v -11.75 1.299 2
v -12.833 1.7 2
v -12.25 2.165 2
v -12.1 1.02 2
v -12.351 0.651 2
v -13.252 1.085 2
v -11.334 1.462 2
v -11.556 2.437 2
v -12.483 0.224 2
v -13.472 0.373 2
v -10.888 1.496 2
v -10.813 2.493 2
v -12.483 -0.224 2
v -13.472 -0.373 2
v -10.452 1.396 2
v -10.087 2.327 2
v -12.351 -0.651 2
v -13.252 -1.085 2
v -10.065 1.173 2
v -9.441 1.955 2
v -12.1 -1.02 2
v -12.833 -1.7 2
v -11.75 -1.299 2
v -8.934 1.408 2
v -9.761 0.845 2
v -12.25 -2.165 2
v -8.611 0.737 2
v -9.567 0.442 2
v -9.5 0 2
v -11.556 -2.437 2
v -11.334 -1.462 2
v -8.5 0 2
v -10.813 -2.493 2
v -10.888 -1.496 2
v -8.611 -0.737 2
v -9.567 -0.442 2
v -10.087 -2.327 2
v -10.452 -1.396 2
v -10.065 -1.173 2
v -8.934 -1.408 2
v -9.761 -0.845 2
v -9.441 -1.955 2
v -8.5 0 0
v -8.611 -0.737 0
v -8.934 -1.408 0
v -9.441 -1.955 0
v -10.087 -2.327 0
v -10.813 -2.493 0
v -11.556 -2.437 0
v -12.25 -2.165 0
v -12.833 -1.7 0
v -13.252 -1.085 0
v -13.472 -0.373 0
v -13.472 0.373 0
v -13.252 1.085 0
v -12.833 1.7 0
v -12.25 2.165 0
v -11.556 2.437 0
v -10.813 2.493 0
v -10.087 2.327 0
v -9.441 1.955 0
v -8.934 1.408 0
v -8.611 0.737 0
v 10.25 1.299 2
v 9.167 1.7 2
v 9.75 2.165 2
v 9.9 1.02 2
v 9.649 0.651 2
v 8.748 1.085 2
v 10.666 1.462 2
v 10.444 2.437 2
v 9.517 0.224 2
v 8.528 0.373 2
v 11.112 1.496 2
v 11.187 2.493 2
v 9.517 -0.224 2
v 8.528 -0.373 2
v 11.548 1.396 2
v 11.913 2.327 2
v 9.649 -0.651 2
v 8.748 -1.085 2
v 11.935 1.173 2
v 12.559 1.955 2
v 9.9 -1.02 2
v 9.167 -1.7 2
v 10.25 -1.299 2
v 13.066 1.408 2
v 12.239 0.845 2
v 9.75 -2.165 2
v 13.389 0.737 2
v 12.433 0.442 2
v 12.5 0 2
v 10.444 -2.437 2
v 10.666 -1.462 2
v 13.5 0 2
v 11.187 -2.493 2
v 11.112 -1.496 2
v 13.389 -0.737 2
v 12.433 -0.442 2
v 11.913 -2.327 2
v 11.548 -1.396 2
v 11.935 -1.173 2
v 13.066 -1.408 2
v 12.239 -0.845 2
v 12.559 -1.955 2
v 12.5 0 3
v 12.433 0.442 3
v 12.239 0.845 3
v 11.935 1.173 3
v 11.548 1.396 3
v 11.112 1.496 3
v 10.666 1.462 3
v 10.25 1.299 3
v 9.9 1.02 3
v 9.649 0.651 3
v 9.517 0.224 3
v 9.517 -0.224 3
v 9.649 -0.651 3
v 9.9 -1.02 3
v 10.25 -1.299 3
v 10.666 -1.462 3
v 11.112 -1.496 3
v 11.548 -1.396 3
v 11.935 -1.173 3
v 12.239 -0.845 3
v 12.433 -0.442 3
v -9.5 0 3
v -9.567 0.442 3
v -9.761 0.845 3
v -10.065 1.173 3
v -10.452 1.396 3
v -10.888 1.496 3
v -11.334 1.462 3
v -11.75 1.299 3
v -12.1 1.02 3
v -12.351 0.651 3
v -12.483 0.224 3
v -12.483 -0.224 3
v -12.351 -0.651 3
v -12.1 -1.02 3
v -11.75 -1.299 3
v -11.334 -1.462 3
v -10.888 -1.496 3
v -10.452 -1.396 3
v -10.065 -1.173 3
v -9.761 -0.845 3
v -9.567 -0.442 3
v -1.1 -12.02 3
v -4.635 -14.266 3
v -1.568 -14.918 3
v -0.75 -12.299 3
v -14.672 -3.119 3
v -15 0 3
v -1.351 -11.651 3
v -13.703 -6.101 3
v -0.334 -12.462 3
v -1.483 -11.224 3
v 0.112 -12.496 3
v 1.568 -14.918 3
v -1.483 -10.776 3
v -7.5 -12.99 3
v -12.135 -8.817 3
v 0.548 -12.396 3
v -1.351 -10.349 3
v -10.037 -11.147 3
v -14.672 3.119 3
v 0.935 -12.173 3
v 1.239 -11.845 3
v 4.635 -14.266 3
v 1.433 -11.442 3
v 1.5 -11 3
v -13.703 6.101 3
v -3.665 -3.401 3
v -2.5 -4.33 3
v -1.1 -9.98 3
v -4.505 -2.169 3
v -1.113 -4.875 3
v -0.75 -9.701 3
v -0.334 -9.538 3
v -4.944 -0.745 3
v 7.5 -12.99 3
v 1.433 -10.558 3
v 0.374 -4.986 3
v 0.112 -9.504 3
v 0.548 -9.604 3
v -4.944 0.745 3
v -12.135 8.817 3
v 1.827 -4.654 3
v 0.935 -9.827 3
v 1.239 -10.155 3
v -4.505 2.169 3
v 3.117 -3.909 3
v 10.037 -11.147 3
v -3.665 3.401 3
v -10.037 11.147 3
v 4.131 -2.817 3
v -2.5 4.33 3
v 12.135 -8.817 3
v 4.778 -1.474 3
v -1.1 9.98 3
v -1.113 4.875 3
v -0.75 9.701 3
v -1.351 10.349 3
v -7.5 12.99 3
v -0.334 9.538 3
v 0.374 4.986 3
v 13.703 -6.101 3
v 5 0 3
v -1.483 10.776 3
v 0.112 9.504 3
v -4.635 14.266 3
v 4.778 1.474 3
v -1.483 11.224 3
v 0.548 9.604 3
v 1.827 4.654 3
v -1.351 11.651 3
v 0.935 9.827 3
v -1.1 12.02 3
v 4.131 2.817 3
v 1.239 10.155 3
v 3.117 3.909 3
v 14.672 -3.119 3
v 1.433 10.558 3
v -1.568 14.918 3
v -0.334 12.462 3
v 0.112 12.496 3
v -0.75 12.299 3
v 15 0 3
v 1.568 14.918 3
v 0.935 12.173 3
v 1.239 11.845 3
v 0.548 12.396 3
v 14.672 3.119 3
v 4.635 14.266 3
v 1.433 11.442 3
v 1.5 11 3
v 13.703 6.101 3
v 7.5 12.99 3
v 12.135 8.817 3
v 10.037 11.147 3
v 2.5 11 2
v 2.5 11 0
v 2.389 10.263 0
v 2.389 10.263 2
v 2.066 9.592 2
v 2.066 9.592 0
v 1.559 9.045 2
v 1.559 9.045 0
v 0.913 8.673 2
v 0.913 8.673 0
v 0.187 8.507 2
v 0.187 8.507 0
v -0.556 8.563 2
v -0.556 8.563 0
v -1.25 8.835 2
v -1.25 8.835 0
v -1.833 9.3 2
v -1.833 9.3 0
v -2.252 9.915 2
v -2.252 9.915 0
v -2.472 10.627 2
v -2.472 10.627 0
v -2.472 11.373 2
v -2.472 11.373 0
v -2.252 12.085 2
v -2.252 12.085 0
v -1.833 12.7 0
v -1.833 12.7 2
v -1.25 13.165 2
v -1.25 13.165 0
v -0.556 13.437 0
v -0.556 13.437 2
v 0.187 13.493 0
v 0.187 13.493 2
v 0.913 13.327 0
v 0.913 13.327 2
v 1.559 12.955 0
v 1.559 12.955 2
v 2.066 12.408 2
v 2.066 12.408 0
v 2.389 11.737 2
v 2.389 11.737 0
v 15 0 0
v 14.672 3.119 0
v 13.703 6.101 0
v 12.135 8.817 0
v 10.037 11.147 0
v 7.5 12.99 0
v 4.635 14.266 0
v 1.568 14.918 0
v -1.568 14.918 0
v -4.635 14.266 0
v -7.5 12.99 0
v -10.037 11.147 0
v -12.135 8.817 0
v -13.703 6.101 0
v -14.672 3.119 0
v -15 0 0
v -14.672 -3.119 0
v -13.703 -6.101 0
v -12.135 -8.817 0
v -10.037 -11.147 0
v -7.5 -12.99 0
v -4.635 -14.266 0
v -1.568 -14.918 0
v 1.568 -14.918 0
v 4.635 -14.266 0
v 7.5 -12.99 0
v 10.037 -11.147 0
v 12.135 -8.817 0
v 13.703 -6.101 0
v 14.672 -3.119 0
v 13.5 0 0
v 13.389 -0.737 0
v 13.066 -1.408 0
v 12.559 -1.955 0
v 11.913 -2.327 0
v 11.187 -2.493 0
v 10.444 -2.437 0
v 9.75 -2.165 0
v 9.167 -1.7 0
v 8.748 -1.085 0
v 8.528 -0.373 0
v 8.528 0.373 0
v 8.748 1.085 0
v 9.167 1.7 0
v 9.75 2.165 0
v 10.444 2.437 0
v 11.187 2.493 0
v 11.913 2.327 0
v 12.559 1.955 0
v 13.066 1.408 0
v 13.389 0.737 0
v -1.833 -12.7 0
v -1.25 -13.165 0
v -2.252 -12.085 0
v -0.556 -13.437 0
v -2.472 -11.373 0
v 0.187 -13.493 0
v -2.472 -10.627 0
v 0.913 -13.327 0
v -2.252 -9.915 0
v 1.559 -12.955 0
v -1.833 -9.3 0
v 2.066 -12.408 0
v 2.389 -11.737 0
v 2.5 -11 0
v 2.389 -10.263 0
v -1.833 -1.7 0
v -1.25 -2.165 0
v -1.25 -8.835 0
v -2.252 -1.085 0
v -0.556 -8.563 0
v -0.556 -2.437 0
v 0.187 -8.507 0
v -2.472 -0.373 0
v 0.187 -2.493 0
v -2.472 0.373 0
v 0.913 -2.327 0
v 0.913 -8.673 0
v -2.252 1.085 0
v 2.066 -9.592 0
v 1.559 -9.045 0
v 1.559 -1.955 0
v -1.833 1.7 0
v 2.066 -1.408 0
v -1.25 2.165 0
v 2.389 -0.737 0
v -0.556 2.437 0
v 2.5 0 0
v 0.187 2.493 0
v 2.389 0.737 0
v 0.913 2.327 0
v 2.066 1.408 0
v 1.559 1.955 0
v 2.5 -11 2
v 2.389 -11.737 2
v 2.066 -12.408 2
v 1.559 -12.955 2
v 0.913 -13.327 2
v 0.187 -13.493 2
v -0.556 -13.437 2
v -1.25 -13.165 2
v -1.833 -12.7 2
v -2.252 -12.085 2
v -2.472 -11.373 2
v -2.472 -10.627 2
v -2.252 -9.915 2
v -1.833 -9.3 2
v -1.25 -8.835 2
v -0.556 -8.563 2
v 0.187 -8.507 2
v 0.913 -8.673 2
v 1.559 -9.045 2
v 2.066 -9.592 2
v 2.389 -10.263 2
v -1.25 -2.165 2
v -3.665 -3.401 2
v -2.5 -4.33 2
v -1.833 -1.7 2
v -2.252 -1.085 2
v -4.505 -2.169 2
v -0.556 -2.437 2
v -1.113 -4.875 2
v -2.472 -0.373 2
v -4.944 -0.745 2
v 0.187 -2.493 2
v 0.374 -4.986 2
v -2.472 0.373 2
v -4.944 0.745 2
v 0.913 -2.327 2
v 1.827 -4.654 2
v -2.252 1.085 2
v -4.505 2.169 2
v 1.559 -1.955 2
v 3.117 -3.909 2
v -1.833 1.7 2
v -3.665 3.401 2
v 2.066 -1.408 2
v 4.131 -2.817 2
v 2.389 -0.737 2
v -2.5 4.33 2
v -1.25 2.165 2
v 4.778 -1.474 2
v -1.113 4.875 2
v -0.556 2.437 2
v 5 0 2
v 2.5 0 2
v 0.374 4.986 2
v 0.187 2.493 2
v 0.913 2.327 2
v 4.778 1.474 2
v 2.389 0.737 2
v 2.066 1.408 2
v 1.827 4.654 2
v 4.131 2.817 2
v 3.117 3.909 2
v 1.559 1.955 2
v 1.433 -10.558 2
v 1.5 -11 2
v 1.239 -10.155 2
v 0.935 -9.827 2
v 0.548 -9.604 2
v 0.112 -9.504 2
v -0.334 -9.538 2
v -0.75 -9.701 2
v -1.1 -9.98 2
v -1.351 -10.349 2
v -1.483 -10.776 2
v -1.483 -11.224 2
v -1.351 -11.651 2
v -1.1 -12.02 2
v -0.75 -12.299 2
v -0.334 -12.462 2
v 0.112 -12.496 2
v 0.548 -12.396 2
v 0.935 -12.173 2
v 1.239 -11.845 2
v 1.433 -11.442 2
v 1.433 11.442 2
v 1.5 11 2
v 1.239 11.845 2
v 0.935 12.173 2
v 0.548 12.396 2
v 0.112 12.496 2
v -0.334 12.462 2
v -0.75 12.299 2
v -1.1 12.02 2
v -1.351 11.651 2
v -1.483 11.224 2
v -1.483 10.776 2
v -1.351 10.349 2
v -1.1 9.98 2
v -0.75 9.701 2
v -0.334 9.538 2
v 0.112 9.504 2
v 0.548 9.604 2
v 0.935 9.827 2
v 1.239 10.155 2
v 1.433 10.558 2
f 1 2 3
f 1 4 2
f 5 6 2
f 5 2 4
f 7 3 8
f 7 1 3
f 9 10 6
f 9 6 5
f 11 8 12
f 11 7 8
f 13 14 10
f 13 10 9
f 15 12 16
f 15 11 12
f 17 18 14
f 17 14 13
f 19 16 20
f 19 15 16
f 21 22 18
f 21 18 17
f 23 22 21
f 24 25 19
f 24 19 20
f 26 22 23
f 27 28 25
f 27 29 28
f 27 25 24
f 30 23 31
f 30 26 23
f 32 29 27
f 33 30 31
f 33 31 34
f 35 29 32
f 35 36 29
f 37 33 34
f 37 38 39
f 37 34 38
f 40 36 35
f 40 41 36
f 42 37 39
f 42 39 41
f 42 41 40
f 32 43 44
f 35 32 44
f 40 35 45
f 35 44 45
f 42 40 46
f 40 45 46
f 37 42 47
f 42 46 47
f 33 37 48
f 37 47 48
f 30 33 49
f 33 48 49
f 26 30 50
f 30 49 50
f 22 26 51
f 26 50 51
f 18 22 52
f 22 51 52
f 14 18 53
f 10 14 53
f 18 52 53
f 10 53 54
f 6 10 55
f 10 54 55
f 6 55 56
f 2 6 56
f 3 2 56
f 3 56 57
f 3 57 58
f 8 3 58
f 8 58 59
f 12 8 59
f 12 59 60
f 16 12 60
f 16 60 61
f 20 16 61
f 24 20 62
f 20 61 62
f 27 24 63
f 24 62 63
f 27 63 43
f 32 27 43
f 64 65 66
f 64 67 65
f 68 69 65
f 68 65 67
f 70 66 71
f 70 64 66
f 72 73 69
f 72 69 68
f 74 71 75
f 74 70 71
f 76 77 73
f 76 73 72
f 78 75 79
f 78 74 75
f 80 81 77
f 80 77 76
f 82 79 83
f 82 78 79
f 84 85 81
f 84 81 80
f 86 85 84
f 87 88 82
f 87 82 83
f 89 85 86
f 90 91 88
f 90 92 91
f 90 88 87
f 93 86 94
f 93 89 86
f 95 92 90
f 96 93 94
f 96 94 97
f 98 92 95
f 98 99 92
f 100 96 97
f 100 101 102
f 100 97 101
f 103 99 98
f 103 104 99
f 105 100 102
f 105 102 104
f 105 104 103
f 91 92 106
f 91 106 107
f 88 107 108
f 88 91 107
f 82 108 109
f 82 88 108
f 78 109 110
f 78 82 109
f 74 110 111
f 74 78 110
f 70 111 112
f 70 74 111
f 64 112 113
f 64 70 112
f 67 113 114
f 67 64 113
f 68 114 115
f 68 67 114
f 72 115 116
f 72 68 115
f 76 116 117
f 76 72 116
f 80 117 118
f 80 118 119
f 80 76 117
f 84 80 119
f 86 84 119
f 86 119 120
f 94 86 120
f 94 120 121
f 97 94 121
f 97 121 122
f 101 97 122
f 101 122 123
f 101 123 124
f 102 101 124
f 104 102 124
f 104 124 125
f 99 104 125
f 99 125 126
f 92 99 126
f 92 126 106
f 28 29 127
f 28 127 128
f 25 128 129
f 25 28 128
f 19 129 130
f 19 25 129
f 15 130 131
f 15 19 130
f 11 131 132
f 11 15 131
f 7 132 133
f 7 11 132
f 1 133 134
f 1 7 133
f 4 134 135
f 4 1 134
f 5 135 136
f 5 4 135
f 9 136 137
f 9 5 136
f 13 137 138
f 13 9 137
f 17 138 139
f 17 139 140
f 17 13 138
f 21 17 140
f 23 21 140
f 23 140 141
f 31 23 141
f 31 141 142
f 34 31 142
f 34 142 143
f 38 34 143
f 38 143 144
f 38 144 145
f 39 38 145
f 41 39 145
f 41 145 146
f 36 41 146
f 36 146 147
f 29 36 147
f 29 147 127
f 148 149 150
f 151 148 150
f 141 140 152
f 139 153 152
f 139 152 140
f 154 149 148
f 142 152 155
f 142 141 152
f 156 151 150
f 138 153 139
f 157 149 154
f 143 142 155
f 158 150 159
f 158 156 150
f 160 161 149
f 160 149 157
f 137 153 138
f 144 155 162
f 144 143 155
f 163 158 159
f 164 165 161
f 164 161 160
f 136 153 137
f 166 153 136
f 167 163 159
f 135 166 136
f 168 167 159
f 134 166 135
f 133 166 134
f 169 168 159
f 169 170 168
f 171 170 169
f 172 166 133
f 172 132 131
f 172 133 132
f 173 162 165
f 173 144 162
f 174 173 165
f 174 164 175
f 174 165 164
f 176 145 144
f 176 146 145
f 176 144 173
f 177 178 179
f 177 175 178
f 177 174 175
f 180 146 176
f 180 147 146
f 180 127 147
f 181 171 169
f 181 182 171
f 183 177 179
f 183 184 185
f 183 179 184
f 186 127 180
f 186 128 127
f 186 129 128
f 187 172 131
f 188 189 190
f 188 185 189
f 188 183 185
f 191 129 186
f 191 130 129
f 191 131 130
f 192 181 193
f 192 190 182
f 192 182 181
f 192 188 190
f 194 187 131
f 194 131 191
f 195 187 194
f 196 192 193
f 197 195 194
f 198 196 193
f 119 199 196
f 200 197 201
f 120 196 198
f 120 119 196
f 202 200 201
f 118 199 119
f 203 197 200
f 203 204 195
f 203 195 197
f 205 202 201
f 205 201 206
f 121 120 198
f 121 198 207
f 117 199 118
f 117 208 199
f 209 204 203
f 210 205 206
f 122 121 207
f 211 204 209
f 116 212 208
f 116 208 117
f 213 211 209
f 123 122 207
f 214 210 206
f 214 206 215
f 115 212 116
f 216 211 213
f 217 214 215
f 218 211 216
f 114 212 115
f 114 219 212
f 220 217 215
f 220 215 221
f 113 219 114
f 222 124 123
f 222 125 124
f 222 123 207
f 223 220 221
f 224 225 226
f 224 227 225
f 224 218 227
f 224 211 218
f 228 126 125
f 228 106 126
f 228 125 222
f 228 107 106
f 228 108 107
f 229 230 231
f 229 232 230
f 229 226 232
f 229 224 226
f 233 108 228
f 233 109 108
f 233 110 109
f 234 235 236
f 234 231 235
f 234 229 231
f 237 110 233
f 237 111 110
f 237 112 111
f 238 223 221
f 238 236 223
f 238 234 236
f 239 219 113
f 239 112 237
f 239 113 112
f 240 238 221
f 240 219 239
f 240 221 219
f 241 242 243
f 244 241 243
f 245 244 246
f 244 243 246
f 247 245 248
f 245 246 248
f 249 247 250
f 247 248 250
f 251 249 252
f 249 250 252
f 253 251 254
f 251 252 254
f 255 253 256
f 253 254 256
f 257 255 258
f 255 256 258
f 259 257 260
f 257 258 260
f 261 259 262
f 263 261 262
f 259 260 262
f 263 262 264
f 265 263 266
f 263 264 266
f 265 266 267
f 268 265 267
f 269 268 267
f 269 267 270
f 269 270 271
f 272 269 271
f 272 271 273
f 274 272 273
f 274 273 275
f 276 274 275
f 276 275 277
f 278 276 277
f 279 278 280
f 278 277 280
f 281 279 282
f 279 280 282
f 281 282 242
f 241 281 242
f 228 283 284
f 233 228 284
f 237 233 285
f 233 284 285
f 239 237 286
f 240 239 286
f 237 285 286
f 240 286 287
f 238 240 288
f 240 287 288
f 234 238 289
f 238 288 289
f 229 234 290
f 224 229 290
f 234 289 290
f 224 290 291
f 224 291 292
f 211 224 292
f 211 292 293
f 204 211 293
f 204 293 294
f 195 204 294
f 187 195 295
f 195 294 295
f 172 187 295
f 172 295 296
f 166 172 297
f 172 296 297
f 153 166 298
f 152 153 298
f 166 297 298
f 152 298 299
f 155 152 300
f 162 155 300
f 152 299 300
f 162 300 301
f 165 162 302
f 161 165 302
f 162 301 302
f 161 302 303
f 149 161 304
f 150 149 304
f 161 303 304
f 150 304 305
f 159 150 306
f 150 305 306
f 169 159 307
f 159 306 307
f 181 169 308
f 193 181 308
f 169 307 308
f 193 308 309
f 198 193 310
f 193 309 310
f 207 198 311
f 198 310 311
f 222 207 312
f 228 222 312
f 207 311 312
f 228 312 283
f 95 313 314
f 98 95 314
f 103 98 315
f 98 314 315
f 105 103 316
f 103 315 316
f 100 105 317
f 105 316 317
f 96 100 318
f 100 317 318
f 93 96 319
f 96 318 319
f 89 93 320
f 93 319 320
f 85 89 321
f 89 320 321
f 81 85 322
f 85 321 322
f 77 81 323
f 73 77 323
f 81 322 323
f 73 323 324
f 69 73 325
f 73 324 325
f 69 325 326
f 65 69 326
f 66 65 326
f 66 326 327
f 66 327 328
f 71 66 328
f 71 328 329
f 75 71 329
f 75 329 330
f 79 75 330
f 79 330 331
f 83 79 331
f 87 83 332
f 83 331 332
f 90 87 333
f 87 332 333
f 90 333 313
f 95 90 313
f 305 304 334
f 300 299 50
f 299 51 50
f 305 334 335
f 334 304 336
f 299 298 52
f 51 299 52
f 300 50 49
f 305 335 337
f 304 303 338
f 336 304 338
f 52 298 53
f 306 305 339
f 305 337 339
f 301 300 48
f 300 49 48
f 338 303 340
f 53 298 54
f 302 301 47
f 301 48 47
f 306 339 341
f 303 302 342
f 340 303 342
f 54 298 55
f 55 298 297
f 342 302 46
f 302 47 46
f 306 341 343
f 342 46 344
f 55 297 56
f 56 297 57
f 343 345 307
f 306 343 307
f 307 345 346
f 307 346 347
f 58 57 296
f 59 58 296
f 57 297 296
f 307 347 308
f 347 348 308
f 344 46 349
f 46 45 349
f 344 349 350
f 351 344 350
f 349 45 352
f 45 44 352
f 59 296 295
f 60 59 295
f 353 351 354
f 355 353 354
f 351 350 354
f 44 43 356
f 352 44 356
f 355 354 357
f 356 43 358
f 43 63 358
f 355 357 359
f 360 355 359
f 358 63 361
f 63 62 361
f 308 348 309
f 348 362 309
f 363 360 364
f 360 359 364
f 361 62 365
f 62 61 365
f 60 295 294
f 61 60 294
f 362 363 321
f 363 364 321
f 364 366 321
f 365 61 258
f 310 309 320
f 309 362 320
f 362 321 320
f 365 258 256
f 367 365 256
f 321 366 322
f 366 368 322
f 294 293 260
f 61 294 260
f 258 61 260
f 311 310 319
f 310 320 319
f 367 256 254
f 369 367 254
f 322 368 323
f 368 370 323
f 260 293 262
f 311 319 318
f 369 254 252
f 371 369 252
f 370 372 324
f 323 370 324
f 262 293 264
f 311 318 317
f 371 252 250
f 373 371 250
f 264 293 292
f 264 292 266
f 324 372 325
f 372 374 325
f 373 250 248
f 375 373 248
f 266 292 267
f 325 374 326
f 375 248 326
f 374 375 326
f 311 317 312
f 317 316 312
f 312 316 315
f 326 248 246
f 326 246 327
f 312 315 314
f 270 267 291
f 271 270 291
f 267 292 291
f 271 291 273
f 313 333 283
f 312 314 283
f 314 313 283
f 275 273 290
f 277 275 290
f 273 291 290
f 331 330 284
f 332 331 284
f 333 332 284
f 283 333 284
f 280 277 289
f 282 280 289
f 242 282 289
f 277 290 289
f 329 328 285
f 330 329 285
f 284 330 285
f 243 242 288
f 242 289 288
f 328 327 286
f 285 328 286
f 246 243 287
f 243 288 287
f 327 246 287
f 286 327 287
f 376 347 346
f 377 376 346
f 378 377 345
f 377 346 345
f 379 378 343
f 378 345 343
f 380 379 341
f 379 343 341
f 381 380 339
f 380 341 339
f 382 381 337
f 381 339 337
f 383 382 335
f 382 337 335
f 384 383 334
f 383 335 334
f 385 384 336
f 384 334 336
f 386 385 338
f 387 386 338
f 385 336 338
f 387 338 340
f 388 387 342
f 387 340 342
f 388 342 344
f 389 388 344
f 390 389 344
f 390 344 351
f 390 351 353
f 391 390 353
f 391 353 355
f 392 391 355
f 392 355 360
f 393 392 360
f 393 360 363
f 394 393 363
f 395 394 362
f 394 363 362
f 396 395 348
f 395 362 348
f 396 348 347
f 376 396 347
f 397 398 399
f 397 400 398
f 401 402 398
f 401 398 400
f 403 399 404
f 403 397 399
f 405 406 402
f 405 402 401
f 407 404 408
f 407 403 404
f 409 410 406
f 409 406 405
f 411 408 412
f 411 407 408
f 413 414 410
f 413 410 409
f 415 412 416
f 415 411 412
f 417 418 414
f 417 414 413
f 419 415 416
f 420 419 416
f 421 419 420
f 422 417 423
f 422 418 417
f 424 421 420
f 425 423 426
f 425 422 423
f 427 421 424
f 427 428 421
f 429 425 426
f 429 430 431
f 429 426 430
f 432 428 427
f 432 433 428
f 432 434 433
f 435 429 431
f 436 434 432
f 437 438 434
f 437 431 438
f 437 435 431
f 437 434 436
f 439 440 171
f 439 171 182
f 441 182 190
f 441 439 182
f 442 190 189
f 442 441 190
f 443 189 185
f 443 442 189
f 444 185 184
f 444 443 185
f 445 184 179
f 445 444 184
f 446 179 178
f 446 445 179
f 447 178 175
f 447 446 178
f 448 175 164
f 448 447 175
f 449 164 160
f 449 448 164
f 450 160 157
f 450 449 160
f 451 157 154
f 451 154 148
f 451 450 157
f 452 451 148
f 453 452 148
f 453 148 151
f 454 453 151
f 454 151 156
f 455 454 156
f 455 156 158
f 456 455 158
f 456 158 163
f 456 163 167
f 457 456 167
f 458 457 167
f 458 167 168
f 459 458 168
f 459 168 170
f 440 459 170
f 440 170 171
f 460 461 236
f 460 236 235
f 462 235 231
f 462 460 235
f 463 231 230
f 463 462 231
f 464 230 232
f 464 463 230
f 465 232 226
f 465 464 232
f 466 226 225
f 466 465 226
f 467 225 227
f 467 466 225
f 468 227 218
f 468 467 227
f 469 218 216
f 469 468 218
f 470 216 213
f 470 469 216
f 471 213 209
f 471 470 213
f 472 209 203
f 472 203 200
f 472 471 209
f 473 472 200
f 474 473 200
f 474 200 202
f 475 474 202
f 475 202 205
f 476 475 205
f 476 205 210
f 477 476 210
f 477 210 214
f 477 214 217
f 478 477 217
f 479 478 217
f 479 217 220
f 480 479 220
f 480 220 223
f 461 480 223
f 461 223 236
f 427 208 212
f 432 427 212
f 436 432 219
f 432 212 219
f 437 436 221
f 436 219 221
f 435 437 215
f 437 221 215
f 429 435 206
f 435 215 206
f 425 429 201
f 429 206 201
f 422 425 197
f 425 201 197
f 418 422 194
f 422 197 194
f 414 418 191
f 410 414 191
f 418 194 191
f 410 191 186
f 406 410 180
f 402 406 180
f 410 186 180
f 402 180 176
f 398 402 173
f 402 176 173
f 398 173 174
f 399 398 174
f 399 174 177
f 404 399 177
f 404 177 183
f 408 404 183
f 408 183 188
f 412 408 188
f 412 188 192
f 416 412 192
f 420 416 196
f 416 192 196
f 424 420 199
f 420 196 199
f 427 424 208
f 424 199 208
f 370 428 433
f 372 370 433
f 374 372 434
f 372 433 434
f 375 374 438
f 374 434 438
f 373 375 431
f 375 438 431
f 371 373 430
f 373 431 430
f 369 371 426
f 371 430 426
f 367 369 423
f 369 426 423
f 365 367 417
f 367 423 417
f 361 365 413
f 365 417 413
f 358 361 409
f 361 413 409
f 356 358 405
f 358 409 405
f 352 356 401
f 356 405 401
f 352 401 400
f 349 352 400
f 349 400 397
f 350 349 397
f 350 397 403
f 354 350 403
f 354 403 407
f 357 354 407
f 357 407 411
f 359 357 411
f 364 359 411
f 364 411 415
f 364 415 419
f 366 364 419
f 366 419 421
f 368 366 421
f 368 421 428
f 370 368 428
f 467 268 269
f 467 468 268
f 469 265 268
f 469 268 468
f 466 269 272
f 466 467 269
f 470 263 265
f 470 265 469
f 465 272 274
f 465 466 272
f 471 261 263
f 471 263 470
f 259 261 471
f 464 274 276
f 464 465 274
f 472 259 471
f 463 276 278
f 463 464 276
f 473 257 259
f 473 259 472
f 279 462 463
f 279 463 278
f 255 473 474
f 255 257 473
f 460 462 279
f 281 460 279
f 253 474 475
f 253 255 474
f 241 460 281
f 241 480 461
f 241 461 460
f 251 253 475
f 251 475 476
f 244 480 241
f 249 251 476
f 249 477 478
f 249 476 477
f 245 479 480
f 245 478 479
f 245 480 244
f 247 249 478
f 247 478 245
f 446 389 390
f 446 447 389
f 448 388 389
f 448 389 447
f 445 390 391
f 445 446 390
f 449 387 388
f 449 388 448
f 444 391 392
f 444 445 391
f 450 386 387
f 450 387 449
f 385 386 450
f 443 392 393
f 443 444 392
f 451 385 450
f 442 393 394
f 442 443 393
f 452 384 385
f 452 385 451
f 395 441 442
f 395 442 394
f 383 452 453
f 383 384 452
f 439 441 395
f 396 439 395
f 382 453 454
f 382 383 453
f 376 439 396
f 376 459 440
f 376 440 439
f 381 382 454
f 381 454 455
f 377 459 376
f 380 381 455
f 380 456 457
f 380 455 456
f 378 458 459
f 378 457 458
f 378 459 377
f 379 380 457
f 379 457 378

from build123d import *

# Parameters (mm, degrees)
SKETCH_R        = 15
SKETCH_R_2      = 1.5
PAD_DEPTH       = 3
SKETCH002_R     = 2.5
POCKET_DEPTH    = 9
SKETCH001_R     = 5
POCKET001_DEPTH = 1
SKETCH003_R     = 2.5
POCKET002_DEPTH = 2


with BuildPart() as part:
    # Sketch → Pad (new body)
    with BuildSketch(Plane.XY):
        Circle(SKETCH_R)
        with Locations((0, 11)):
            Circle(SKETCH_R_2, mode=Mode.SUBTRACT)
        with Locations((-11, 0)):
            Circle(SKETCH_R_2, mode=Mode.SUBTRACT)
        with Locations((0, -11)):
            Circle(SKETCH_R_2, mode=Mode.SUBTRACT)
        with Locations((11, 0)):
            Circle(SKETCH_R_2, mode=Mode.SUBTRACT)
    extrude(amount=PAD_DEPTH)

    # Sketch002 (on Face7 of Pad) → Pocket (cut)
    with BuildSketch(Plane.XY.offset(3)):
        Circle(SKETCH002_R)
    extrude(amount=-POCKET_DEPTH, mode=Mode.SUBTRACT)

    # Sketch001 (on Face7 of Pad) → Pocket001 (cut)
    with BuildSketch(Plane.XY.offset(3)):
        Circle(SKETCH001_R)
    extrude(amount=-POCKET001_DEPTH, mode=Mode.SUBTRACT)

    # Sketch003 (on Face2 of Pocket001) → Pocket002 (cut)
    with BuildSketch(Plane(origin=(0, 0, 0), x_dir=(1, 0, 0), z_dir=(0, 0, -1))):
        with Locations((0, 11)):
            Circle(SKETCH003_R)
        with Locations((11, 0)):
            Circle(SKETCH003_R)
        with Locations((0, -11)):
            Circle(SKETCH003_R)
        with Locations((-11, 0)):
            Circle(SKETCH003_R)
    extrude(amount=-POCKET002_DEPTH, mode=Mode.SUBTRACT)


solid = part.part
